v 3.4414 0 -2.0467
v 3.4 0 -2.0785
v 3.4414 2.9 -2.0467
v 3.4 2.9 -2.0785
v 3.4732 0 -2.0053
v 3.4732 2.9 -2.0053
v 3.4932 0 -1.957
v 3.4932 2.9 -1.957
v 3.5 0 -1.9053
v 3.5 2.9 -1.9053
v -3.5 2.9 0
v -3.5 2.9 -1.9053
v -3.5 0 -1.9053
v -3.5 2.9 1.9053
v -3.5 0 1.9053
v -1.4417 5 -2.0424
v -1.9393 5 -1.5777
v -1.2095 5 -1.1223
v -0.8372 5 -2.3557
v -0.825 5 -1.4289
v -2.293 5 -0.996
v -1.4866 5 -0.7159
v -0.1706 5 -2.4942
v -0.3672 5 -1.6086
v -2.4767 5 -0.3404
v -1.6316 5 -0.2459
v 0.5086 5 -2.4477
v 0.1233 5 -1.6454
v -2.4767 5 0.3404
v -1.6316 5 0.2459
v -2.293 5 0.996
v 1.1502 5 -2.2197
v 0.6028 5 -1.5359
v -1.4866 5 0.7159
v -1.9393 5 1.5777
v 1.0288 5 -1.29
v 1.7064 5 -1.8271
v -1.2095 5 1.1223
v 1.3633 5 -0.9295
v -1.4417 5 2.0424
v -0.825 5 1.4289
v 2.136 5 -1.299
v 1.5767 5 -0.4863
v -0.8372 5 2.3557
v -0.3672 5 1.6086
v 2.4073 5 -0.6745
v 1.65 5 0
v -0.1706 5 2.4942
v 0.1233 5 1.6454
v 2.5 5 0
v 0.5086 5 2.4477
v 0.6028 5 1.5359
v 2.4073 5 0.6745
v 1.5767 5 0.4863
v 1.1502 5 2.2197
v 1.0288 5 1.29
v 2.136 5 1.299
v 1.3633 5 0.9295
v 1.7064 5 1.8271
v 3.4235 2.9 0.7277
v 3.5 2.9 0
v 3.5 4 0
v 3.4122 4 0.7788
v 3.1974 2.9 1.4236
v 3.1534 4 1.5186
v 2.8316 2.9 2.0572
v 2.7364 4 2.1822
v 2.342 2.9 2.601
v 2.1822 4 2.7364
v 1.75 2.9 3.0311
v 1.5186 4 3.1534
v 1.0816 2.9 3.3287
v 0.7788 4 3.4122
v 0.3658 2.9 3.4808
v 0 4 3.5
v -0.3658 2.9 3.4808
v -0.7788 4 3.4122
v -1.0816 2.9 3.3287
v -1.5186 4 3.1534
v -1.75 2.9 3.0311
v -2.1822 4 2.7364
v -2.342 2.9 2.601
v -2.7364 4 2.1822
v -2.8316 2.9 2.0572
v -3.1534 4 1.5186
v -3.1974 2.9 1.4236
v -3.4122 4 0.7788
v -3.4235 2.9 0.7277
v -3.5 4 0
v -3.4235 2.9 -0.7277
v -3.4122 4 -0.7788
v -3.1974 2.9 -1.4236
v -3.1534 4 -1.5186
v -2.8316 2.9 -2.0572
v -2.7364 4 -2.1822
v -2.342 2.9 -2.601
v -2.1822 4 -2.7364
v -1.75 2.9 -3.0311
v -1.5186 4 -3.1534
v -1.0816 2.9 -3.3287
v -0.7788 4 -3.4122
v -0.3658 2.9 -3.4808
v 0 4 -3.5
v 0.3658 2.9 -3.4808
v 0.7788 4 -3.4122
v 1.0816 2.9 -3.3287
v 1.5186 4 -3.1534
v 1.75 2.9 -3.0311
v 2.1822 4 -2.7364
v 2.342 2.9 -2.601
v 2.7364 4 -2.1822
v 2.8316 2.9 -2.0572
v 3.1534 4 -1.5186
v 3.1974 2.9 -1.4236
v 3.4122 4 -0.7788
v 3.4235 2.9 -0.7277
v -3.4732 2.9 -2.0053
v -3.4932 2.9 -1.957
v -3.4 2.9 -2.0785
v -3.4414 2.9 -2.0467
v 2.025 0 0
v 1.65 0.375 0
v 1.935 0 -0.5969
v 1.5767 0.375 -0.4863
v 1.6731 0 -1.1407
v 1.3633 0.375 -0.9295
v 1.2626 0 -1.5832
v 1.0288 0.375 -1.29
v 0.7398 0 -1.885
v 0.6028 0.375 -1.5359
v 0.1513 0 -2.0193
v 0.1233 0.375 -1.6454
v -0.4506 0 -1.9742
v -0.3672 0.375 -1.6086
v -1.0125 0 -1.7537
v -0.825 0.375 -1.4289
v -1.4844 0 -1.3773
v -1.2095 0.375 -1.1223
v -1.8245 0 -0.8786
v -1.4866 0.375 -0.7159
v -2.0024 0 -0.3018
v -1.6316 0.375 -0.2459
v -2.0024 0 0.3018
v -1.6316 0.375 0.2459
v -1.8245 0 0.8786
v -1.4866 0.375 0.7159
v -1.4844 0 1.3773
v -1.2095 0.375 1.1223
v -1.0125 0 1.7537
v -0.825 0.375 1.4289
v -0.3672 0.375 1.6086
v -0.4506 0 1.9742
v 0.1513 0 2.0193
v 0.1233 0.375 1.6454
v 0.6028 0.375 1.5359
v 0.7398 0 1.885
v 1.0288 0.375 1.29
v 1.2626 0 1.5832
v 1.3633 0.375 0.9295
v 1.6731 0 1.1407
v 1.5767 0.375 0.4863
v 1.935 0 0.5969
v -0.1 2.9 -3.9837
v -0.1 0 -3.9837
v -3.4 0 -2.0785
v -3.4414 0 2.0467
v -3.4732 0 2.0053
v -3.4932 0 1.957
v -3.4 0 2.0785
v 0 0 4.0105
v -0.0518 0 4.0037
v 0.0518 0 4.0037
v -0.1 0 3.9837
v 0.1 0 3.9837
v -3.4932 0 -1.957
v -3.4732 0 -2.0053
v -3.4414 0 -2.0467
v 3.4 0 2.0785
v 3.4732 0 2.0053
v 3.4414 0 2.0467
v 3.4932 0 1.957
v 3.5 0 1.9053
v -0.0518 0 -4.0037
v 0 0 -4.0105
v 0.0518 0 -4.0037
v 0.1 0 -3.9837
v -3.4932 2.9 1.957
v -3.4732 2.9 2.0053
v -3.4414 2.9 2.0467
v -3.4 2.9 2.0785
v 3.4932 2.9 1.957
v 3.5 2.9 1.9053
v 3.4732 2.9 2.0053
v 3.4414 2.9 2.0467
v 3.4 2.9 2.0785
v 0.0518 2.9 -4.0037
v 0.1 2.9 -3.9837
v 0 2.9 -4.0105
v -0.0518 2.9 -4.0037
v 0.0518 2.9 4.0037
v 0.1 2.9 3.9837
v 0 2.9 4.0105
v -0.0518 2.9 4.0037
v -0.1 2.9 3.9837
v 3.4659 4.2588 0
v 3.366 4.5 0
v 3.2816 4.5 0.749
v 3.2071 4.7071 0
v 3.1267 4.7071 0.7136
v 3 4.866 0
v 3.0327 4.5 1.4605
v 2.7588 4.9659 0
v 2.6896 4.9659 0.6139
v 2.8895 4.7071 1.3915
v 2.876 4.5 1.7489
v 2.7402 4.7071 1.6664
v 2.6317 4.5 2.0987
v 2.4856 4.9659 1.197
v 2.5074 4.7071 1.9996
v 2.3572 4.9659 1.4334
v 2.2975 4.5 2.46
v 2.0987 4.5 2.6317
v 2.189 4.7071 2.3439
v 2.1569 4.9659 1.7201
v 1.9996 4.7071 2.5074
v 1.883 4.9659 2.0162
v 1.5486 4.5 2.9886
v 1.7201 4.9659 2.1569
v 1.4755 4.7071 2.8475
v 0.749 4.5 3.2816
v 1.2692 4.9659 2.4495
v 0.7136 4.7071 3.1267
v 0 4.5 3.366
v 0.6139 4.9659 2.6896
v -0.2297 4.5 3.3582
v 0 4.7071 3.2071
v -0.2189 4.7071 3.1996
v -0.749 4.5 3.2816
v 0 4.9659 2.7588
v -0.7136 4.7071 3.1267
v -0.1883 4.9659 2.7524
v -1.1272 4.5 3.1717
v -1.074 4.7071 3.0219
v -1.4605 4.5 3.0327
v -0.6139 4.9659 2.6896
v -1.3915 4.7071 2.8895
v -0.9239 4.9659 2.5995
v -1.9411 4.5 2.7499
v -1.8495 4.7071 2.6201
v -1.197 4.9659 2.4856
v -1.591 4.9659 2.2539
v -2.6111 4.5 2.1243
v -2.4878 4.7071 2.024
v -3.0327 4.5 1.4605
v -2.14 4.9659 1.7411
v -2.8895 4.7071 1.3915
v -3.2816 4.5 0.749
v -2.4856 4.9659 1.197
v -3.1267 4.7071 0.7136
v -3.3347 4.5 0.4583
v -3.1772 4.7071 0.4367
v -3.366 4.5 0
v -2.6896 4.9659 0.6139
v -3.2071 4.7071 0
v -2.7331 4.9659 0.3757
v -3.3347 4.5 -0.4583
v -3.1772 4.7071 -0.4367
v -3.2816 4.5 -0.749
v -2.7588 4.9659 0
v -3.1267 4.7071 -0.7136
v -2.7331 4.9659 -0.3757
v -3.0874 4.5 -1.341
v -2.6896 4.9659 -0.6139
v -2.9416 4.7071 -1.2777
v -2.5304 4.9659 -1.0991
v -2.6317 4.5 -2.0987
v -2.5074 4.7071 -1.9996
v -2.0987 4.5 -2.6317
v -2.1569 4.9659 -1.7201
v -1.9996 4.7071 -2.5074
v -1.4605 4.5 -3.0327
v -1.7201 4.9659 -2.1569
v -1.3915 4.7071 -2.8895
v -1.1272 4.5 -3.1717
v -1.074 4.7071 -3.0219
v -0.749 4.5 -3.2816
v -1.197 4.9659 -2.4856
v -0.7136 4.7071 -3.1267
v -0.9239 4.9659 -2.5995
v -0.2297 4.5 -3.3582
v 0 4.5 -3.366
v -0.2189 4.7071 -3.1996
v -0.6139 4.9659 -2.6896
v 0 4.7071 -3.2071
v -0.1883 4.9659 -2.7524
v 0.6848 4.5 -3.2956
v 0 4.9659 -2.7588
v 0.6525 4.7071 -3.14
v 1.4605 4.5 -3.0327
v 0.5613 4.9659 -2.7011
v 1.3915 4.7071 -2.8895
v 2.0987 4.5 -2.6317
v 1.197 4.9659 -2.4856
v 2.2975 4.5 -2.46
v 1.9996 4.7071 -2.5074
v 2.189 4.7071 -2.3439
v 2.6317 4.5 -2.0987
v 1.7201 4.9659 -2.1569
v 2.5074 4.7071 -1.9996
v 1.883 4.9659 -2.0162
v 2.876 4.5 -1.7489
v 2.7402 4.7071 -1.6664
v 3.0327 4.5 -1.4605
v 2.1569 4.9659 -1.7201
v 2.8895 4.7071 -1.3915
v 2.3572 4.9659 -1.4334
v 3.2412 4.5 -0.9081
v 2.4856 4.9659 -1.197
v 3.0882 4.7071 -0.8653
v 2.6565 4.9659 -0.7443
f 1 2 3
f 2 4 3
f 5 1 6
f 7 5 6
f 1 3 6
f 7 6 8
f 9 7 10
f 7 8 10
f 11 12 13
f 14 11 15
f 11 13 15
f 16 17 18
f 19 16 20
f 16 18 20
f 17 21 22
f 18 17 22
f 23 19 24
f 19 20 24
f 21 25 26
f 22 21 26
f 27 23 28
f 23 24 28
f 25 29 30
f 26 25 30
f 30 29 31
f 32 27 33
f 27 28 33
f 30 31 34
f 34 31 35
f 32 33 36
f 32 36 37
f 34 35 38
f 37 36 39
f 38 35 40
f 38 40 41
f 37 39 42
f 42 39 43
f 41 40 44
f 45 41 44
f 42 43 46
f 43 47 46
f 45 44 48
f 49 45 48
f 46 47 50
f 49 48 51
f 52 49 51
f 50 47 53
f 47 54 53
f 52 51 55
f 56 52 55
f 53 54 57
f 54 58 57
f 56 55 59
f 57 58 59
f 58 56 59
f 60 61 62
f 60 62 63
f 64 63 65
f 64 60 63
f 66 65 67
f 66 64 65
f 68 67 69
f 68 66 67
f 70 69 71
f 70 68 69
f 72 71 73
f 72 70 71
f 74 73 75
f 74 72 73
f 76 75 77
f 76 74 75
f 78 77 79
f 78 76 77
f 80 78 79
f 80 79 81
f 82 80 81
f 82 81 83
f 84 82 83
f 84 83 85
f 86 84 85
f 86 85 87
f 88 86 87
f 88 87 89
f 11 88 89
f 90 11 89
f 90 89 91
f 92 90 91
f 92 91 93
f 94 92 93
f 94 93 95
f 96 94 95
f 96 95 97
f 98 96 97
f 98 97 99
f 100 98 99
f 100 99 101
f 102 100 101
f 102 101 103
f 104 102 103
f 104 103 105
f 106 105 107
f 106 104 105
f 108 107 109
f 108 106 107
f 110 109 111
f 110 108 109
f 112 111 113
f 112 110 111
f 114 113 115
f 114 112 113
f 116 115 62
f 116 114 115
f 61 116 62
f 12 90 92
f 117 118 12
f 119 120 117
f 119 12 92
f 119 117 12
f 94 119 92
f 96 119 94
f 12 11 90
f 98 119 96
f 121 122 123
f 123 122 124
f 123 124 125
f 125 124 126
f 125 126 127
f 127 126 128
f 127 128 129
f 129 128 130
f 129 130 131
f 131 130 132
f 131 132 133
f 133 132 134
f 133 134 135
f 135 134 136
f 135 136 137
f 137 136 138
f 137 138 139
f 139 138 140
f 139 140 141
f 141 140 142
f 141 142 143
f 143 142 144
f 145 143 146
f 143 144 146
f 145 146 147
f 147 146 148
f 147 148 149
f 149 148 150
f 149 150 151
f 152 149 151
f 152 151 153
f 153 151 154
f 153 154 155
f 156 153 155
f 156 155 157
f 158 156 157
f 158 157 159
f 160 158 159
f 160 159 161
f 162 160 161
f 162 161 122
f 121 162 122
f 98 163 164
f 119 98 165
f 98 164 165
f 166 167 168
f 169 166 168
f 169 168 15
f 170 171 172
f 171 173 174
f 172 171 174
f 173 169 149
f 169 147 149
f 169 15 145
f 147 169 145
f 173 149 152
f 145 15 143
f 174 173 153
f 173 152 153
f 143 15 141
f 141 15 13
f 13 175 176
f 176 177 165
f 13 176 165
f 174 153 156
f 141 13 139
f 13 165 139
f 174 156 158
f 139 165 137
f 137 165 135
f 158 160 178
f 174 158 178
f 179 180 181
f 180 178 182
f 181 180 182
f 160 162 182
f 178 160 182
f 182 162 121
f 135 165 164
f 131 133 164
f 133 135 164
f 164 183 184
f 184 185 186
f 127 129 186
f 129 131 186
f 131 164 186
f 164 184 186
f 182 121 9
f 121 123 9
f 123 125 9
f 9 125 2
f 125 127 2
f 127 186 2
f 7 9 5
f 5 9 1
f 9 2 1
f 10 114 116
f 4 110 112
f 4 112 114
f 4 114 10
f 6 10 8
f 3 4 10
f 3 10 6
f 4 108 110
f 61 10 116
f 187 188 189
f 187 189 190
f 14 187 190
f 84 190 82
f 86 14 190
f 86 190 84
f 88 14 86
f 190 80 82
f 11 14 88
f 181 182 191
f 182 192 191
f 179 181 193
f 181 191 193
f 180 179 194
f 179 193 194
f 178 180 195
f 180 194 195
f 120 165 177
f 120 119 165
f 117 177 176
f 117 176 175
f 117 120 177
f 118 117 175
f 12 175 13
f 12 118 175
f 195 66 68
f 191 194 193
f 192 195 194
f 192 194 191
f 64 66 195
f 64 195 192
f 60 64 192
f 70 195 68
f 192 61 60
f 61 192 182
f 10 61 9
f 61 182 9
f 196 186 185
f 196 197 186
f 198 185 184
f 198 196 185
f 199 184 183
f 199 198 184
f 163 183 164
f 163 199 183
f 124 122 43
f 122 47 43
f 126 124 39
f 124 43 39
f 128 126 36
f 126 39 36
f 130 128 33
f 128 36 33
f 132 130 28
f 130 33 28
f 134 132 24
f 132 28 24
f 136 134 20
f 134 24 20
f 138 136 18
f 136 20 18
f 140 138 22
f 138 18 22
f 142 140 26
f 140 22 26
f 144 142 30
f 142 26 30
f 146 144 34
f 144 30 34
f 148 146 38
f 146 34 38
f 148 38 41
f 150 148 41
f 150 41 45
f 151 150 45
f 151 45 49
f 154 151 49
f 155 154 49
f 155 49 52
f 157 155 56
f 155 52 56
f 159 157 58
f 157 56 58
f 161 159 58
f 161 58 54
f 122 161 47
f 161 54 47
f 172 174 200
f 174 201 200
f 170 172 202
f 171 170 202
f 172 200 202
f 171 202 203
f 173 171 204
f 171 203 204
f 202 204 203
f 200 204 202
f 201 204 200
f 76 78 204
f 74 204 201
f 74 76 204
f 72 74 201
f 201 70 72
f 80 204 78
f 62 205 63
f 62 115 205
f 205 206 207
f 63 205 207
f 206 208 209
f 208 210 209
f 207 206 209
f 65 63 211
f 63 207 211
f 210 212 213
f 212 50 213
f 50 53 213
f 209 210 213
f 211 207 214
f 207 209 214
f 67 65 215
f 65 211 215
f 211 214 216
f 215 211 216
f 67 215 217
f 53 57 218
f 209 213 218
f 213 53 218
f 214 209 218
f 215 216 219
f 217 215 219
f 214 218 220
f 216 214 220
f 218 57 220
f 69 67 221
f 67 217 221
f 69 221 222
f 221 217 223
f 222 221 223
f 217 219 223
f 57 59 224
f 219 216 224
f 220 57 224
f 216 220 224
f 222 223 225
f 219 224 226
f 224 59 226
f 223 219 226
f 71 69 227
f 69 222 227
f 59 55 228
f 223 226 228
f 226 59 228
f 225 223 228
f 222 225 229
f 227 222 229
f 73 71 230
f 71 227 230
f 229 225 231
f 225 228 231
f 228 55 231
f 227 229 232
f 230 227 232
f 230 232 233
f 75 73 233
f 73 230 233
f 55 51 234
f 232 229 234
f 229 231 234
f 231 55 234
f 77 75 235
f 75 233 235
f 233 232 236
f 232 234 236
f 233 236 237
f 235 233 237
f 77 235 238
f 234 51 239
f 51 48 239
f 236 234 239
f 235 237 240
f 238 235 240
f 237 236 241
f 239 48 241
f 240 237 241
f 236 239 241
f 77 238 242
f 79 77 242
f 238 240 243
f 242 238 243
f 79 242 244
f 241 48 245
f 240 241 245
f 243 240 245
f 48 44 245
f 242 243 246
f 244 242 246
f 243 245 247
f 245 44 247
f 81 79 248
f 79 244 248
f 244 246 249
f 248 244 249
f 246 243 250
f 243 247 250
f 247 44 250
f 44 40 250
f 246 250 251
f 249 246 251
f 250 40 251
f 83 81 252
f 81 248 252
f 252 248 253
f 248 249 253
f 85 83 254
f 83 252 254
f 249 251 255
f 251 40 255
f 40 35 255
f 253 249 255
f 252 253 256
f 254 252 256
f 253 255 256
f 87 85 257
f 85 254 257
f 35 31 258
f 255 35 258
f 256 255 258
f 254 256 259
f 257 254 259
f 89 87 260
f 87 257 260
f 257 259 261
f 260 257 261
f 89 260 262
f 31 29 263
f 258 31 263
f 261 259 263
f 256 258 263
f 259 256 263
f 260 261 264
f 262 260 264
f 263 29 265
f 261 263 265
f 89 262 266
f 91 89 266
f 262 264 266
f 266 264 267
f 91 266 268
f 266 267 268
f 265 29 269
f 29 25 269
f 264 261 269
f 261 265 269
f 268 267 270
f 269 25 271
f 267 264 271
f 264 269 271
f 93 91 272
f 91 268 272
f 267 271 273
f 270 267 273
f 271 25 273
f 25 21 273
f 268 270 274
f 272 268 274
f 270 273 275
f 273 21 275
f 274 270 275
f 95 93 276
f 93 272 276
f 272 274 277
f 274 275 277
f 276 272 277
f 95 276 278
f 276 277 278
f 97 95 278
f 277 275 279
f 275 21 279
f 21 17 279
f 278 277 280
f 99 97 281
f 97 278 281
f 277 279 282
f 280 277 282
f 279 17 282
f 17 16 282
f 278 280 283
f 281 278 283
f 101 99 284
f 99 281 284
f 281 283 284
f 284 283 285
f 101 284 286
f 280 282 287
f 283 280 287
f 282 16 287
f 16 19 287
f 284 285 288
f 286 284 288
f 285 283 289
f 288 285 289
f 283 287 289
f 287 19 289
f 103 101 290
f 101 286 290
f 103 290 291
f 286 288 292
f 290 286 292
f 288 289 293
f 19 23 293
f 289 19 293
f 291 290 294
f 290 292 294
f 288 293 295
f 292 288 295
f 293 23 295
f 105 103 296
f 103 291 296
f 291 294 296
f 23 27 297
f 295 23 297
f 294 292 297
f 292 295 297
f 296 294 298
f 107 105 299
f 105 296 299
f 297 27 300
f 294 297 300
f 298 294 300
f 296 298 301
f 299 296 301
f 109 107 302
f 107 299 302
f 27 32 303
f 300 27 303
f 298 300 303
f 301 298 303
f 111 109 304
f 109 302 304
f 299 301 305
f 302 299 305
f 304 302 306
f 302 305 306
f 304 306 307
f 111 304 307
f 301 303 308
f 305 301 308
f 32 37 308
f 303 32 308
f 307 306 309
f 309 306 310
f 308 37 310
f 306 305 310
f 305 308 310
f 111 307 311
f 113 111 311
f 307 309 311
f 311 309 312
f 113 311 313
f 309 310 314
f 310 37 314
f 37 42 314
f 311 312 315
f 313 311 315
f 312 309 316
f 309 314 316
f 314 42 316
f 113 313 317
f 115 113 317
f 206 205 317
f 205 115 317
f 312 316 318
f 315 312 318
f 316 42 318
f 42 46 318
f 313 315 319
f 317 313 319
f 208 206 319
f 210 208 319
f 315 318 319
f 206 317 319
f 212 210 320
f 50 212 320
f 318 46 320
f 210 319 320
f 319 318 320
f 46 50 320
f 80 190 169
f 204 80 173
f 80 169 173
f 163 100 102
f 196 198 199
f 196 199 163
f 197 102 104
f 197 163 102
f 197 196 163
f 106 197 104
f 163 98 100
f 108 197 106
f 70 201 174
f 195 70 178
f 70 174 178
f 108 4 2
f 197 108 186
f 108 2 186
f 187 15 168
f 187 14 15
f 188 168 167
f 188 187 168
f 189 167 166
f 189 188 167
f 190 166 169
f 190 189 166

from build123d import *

# Parameters (mm, degrees)
EXTRUDE_1_DEPTH              = 2.9
SKETCH_2_R                   = 3.5
EXTRUDE_2_DEPTH              = 5
FILLET_1_R                   = 1
FILLET_2_R                   = 0.2
HOLE_WIZARD_M4_1_D           = 3.3
HOLE_WIZARD_M4_1_DEPTH       = 10.1
HOLE_WIZARD_M4_1_CSINK_D     = 4.05
HOLE_WIZARD_M4_1_CSINK_ANGLE = 90
HOLE_WIZARD_M4_1_TIP         = 0.991420021


with BuildPart() as part:
    # 草图1 → 凸台-拉伸1 (new body)
    with BuildSketch(Plane(origin=(0, 0, 0), x_dir=(1, 0, 0), z_dir=(0, 1, 0))):
        Polygon((3.5, -2.020725942), (3.5, 2.020725942), (0, 4.041451884), (-3.5, 2.020725942), (-3.5, -2.020725942), (0, -4.041451884), align=None)
    extrude(amount=EXTRUDE_1_DEPTH)

    # 草图2 → 凸台-拉伸2 (add)
    with BuildSketch(Plane.XZ):
        Circle(SKETCH_2_R)
    extrude(amount=-EXTRUDE_2_DEPTH)

    # 圆角1
    fillet_1_edges = [part.edges().sort_by_distance(p)[0] for p in [
        (-3.5, 5, 0),
    ]]
    fillet(fillet_1_edges, radius=FILLET_1_R)

    # 圆角2
    fillet_2_edges = [part.edges().sort_by_distance(p)[0] for p in [
        (0, 1.45, 4.041451884),
        (-3.5, 1.45, 2.020725942),
        (-3.5, 1.45, -2.020725942),
        (0, 1.45, -4.041451884),
        (3.5, 1.45, -2.020725942),
        (3.5, 1.45, 2.020725942),
    ]]
    fillet(fillet_2_edges, radius=FILLET_2_R)

    # M4 螺纹孔1
    with Locations(Plane(origin=(0, 0, 0), x_dir=(-1, 0, 0), z_dir=(0, -1, 0))):
        with Locations((0, 0)):
            CounterSinkHole(HOLE_WIZARD_M4_1_D / 2, HOLE_WIZARD_M4_1_CSINK_D / 2, depth=HOLE_WIZARD_M4_1_DEPTH, counter_sink_angle=HOLE_WIZARD_M4_1_CSINK_ANGLE)
            with Locations((0, 0, -(HOLE_WIZARD_M4_1_DEPTH + HOLE_WIZARD_M4_1_TIP / 2))):  # 118° drill point
                Cone(0, HOLE_WIZARD_M4_1_D / 2, HOLE_WIZARD_M4_1_TIP, mode=Mode.SUBTRACT)


solid = part.part
